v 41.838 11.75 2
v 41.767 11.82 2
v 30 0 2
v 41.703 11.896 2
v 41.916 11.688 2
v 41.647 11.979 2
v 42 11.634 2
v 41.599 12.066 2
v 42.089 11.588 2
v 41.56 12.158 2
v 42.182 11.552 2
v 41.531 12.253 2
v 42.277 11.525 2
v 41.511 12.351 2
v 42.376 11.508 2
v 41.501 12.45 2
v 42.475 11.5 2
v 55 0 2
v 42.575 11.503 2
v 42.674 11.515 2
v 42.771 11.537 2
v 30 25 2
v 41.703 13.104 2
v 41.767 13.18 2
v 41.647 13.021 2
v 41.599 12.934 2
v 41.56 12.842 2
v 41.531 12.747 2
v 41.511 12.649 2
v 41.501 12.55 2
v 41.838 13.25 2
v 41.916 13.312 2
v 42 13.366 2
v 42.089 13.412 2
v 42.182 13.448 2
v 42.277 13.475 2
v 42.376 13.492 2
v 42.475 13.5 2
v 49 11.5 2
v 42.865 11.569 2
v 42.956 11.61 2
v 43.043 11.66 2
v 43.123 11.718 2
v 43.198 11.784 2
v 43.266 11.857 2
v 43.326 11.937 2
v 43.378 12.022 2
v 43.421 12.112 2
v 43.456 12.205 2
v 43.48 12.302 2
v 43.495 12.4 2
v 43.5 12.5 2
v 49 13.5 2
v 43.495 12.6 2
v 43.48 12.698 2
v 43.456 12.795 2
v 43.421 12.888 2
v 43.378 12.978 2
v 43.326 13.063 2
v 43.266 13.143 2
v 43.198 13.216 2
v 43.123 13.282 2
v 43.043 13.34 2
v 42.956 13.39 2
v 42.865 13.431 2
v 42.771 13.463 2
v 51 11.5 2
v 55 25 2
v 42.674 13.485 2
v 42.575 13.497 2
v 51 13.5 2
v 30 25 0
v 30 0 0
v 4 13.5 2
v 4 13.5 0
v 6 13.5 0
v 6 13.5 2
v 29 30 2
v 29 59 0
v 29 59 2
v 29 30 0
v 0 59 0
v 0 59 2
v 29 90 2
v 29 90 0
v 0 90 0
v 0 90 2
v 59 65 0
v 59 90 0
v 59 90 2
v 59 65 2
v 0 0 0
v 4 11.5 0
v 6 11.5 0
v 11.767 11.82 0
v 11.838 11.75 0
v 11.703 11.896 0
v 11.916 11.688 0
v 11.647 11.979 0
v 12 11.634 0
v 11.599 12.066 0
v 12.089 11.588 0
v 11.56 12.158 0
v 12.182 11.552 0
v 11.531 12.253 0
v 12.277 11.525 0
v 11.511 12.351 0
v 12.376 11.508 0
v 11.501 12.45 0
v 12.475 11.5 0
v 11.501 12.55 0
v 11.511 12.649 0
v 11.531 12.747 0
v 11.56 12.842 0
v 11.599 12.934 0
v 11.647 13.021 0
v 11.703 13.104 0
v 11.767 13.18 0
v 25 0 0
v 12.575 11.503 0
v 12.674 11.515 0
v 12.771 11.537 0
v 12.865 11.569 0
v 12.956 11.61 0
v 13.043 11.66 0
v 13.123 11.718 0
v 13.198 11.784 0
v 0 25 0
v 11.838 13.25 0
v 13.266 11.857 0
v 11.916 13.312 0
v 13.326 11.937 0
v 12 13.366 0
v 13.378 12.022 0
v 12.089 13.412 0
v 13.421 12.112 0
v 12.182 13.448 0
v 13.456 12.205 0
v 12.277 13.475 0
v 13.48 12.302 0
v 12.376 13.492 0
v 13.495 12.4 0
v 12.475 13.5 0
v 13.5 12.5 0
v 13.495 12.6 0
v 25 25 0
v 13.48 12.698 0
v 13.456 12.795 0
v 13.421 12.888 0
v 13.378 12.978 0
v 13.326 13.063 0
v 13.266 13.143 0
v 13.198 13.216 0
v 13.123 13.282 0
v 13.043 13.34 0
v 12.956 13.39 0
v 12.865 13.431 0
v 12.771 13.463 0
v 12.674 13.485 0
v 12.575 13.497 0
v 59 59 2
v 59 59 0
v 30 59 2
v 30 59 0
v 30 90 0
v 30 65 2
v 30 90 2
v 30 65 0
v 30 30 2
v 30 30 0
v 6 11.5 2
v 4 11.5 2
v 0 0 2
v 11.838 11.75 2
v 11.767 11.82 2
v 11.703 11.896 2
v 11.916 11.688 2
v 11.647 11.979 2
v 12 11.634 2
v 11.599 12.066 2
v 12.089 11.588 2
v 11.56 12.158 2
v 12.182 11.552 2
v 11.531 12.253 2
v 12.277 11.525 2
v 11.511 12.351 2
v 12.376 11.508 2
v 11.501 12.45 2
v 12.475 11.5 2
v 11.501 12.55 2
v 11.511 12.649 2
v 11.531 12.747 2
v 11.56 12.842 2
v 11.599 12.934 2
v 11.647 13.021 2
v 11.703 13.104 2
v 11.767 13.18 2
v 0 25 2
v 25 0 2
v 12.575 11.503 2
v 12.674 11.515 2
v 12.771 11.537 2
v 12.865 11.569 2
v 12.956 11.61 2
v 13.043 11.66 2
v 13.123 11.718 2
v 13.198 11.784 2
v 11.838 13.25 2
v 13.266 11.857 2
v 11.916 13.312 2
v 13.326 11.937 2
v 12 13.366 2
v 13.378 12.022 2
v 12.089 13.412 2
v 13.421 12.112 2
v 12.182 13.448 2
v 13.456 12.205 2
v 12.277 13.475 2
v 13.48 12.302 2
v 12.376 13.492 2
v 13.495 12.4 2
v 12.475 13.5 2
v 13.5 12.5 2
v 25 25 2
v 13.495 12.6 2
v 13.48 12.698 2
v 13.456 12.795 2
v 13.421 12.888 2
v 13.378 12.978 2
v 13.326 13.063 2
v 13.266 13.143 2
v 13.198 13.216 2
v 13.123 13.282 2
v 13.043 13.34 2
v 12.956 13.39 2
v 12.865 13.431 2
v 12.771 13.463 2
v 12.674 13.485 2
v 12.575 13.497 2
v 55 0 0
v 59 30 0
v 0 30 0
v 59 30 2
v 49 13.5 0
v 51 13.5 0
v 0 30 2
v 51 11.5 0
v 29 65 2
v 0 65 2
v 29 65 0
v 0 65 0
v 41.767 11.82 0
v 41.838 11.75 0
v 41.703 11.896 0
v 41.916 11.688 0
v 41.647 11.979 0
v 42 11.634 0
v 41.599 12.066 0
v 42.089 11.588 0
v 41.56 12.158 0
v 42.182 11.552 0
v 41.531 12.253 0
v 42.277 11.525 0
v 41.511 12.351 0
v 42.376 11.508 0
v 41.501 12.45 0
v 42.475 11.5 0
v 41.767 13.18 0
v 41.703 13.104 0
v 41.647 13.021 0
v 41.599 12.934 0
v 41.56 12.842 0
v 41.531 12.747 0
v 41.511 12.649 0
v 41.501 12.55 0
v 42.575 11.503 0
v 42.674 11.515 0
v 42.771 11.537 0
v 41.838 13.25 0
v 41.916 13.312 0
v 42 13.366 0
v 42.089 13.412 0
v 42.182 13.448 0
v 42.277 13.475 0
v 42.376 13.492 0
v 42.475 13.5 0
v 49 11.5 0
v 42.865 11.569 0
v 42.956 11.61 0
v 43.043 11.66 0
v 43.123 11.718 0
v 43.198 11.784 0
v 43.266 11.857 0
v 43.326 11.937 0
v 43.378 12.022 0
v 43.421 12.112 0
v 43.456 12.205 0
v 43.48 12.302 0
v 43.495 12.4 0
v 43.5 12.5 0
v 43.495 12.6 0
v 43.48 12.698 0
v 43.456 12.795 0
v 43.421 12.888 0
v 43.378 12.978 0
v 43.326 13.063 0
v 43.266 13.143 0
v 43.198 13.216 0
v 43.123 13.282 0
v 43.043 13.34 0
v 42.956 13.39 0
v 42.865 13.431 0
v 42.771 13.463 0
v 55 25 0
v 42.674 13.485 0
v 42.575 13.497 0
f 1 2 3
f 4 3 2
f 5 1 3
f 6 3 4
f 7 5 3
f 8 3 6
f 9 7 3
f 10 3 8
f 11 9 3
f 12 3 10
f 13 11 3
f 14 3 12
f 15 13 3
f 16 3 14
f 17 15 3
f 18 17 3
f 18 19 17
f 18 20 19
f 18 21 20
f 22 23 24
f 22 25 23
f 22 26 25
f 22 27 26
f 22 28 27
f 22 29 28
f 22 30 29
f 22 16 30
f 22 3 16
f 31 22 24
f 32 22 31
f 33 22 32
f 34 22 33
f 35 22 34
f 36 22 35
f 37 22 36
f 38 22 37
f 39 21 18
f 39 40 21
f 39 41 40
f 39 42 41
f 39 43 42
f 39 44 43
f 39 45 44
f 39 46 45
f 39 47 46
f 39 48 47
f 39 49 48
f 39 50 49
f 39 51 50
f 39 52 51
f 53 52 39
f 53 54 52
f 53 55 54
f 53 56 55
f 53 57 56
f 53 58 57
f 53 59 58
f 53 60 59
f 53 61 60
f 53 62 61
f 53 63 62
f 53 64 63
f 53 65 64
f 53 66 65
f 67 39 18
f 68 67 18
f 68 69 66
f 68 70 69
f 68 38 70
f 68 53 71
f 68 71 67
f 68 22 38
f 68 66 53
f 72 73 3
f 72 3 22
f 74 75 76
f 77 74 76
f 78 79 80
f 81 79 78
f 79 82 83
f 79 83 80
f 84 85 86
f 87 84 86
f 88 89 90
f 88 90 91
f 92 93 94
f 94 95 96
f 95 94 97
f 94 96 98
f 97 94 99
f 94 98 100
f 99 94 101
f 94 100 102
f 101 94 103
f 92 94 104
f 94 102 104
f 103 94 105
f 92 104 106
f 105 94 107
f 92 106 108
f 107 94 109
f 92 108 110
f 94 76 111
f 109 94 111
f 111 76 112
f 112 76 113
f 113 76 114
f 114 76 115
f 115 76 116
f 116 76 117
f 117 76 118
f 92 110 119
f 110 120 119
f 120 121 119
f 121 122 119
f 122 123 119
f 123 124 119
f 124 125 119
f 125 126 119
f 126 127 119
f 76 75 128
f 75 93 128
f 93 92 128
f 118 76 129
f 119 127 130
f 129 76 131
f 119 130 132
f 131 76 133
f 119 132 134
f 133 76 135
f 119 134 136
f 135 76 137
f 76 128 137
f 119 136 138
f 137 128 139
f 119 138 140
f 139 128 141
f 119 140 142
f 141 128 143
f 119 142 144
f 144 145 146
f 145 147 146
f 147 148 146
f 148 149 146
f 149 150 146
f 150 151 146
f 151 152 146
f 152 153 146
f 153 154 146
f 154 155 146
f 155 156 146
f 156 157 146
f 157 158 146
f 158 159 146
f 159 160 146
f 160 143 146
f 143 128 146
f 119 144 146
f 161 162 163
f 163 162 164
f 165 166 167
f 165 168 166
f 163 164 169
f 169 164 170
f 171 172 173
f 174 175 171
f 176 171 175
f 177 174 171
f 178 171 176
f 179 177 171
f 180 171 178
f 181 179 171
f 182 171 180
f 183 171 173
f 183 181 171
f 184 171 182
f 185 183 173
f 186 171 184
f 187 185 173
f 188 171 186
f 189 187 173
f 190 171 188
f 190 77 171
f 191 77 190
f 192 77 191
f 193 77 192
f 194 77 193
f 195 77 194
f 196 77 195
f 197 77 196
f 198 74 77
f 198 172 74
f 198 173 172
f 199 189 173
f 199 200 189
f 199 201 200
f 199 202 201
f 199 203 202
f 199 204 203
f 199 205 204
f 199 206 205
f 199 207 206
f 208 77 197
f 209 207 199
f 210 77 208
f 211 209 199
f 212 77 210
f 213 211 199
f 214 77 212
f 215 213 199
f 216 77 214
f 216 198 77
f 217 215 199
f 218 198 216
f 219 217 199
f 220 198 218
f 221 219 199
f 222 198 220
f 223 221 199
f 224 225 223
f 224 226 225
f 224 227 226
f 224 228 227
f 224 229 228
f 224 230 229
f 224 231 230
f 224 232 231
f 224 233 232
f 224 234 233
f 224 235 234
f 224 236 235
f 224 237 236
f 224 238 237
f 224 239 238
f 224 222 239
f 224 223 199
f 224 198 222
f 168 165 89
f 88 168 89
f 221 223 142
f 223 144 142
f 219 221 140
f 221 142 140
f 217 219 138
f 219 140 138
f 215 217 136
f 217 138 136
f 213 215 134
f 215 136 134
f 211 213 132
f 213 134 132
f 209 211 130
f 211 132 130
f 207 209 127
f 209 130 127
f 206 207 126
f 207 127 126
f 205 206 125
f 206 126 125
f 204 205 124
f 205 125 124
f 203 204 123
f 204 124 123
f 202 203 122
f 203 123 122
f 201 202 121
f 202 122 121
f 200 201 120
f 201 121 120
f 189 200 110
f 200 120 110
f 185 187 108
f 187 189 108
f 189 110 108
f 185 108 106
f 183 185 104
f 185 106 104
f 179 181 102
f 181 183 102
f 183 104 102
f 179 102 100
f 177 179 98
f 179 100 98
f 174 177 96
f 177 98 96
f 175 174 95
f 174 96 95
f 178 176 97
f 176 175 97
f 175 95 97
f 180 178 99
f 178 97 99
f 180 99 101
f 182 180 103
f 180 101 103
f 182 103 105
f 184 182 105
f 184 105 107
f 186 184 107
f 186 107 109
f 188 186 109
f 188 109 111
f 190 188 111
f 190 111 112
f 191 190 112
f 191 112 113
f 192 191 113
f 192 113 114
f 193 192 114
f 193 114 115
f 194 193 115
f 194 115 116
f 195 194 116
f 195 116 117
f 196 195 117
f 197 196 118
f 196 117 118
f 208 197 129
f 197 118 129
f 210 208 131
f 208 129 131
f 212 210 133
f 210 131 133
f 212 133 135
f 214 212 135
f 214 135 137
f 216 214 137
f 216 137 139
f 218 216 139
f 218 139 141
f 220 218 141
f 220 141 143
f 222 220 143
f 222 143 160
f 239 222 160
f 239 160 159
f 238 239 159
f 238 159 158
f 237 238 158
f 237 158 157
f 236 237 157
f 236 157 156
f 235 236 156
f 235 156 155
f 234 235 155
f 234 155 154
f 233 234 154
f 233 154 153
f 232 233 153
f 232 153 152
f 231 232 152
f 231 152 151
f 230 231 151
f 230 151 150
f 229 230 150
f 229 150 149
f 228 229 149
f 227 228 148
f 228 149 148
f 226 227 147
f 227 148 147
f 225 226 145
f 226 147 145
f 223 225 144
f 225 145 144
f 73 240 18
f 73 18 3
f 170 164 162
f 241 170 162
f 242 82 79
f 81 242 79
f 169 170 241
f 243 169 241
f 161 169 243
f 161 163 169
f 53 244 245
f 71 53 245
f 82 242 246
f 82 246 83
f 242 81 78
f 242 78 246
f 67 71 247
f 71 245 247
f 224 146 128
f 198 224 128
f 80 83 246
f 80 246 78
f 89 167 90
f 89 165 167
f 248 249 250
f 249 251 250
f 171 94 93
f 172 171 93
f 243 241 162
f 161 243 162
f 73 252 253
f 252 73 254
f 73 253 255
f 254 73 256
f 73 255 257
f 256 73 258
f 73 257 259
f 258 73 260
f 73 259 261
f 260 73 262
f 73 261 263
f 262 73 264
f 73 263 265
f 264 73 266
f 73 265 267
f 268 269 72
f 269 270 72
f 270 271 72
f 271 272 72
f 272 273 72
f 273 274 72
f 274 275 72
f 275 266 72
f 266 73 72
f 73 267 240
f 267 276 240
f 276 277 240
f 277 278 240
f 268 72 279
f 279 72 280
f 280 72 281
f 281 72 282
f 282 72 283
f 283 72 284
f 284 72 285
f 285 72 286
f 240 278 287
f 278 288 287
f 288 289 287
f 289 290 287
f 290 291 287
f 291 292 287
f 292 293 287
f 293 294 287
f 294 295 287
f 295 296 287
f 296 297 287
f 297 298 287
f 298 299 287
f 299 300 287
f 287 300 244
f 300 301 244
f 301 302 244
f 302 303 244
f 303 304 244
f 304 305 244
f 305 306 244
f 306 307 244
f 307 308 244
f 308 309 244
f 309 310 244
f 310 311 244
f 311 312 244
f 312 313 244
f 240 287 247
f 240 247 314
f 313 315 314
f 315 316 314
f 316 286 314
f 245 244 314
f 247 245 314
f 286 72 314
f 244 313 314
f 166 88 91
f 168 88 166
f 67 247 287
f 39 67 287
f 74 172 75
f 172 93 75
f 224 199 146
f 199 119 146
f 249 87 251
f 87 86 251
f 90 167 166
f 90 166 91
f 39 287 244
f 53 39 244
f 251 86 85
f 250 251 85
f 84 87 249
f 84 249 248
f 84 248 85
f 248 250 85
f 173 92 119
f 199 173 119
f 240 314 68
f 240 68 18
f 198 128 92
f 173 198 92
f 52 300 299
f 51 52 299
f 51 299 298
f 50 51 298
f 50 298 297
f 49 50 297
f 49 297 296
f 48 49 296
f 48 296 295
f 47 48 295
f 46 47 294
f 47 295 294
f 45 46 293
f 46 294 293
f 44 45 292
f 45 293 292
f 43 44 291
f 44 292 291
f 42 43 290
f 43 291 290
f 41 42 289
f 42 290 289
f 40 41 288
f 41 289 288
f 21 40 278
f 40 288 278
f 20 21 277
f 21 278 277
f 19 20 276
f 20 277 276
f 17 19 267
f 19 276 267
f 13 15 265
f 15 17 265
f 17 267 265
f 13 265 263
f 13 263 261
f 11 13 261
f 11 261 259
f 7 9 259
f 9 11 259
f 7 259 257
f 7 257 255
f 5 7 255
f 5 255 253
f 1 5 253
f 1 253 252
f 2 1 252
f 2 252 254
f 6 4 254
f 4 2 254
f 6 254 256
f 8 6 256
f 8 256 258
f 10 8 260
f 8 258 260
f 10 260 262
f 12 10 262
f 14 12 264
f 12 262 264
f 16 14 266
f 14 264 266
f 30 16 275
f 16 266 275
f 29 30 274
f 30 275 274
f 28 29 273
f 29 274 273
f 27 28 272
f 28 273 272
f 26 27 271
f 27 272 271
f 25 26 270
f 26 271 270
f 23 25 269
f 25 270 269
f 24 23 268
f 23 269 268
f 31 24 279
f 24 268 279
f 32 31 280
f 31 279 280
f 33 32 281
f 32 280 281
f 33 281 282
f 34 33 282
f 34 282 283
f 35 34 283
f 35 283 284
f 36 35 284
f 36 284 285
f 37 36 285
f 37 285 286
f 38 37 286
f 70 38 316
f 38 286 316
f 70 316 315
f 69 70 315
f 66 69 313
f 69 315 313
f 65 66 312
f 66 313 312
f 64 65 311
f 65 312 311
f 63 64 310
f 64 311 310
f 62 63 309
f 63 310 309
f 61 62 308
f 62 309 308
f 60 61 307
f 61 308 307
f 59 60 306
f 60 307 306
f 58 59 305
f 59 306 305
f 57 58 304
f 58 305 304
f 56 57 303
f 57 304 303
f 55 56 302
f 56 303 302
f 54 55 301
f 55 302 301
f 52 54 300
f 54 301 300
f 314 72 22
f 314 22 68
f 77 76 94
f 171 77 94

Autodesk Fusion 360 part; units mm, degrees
sketch "スケッチ1" plane through (0, 0, 0) normal (0, 0, 1) x (1, 0, 0)
  line L0 (0, 0) -> (25, 0)
  line L1 (25, 0) -> (25, 25)
  line L2 (25, 25) -> (0, 25)
  line L3 (0, 25) -> (0, 0)
  line L4 (30, 25) -> (55, 25)
  line L5 (55, 25) -> (55, 0)
  line L6 (55, 0) -> (30, 0)
  line L7 (30, 0) -> (30, 25)
  line L8 (0, 59) -> (29, 59)
  line L9 (29, 59) -> (29, 30)
  line L10 (29, 30) -> (0, 30)
  line L11 (0, 30) -> (0, 59)
  line L12 (30, 30) -> (59, 30)
  line L13 (59, 30) -> (59, 59)
  line L14 (59, 59) -> (30, 59)
  line L15 (30, 59) -> (30, 30)
  line L16 (0, 65) -> (29, 65)
  line L17 (29, 65) -> (29, 90)
  line L18 (29, 90) -> (0, 90)
  line L19 (0, 90) -> (0, 65)
  line L20 (30, 90) -> (59, 90)
  line L21 (59, 90) -> (59, 65)
  line L22 (59, 65) -> (30, 65)
  line L23 (30, 65) -> (30, 90)
  circle A0 centre (12.5, 12.5) radius 1
  circle A1 centre (42.5, 12.5) radius 1
  line L24 (4, 13.5) -> (6, 13.5)
  line L25 (6, 13.5) -> (6, 11.5)
  line L26 (6, 11.5) -> (4, 11.5)
  line L27 (4, 11.5) -> (4, 13.5)
  line L28 (49, 13.5) -> (51, 13.5)
  line L29 (51, 13.5) -> (51, 11.5)
  line L30 (51, 11.5) -> (49, 11.5)
  line L31 (49, 11.5) -> (49, 13.5)
  circle A2 centre (60, 0) radius 1
  line L32 (64, 1) -> (66, 1)
  line L33 (66, 1) -> (66, -1)
  line L34 (66, -1) -> (64, -1)
  line L35 (64, -1) -> (64, 1)
  line L36 (70, 5) -> (75, 5)
  line L37 (75, 5) -> (75, 0)
  line L38 (75, 0) -> (70, 0)
  line L39 (70, 0) -> (70, 5)
  circle A3 centre (72.5, 2.5) radius 1
  line L40 (70, 12.5) -> (75, 12.5)
  line L41 (75, 12.5) -> (75, 7.5)
  line L42 (75, 7.5) -> (70, 7.5)
  line L43 (70, 7.5) -> (70, 12.5)
  line L44 (73.5, 11) -> (71.5, 11)
  line L45 (71.5, 11) -> (71.5, 9)
  line L46 (71.5, 9) -> (73.5, 9)
  line L47 (73.5, 9) -> (73.5, 11)
  line L48 (73.5, 11) -> (71.5, 9) construction
  line L49 (71.5, 11) -> (73.5, 9) construction
  point P0 (72.5, 10)
  dimension "d13" = 2
extrude "押し出し1" add sketch "スケッチ1" along normal blind 2 contours L0 L1 L2 L3 makes body 1 in component "前"
extrude "押し出し1'" add sketch "スケッチ1" along normal blind 2 separate body contours L4 L5 L6 L7 makes body 2 in component "後"
extrude "押し出し1''" add sketch "スケッチ1" along normal blind 2 separate body contours L8 L9 L10 L11 makes body 3 in component "上"
extrude "押し出し1'''" add sketch "スケッチ1" along normal blind 2 separate body contours L12 L13 L14 L15 makes body 4 in component "下"
extrude "押し出し1''''" add sketch "スケッチ1" along normal blind 2 separate body contours L16 L17 L18 L19 makes body 5 in component "左"
extrude "押し出し1'''''" add sketch "スケッチ1" along normal blind 2 separate body contours L20 L21 L22 L23 makes body 6 in component "右"
component "前" placed x (1, 0, 0) y (0, 1, 0) z (0, 0, 1) at (0, 0, 0)
component "後" placed x (1, 0, 0) y (0, 1, 0) z (0, 0, 1) at (0, 0, 0)
component "上" placed x (1, 0, 0) y (0, 1, 0) z (0, 0, 1) at (0, 0, 0)
component "下" placed x (1, 0, 0) y (0, 1, 0) z (0, 0, 1) at (0, 0, 0)
component "左" placed x (1, 0, 0) y (0, 1, 0) z (0, 0, 1) at (0, 0, 0)
component "右" placed x (1, 0, 0) y (0, 1, 0) z (0, 0, 1) at (0, 0, 0)
